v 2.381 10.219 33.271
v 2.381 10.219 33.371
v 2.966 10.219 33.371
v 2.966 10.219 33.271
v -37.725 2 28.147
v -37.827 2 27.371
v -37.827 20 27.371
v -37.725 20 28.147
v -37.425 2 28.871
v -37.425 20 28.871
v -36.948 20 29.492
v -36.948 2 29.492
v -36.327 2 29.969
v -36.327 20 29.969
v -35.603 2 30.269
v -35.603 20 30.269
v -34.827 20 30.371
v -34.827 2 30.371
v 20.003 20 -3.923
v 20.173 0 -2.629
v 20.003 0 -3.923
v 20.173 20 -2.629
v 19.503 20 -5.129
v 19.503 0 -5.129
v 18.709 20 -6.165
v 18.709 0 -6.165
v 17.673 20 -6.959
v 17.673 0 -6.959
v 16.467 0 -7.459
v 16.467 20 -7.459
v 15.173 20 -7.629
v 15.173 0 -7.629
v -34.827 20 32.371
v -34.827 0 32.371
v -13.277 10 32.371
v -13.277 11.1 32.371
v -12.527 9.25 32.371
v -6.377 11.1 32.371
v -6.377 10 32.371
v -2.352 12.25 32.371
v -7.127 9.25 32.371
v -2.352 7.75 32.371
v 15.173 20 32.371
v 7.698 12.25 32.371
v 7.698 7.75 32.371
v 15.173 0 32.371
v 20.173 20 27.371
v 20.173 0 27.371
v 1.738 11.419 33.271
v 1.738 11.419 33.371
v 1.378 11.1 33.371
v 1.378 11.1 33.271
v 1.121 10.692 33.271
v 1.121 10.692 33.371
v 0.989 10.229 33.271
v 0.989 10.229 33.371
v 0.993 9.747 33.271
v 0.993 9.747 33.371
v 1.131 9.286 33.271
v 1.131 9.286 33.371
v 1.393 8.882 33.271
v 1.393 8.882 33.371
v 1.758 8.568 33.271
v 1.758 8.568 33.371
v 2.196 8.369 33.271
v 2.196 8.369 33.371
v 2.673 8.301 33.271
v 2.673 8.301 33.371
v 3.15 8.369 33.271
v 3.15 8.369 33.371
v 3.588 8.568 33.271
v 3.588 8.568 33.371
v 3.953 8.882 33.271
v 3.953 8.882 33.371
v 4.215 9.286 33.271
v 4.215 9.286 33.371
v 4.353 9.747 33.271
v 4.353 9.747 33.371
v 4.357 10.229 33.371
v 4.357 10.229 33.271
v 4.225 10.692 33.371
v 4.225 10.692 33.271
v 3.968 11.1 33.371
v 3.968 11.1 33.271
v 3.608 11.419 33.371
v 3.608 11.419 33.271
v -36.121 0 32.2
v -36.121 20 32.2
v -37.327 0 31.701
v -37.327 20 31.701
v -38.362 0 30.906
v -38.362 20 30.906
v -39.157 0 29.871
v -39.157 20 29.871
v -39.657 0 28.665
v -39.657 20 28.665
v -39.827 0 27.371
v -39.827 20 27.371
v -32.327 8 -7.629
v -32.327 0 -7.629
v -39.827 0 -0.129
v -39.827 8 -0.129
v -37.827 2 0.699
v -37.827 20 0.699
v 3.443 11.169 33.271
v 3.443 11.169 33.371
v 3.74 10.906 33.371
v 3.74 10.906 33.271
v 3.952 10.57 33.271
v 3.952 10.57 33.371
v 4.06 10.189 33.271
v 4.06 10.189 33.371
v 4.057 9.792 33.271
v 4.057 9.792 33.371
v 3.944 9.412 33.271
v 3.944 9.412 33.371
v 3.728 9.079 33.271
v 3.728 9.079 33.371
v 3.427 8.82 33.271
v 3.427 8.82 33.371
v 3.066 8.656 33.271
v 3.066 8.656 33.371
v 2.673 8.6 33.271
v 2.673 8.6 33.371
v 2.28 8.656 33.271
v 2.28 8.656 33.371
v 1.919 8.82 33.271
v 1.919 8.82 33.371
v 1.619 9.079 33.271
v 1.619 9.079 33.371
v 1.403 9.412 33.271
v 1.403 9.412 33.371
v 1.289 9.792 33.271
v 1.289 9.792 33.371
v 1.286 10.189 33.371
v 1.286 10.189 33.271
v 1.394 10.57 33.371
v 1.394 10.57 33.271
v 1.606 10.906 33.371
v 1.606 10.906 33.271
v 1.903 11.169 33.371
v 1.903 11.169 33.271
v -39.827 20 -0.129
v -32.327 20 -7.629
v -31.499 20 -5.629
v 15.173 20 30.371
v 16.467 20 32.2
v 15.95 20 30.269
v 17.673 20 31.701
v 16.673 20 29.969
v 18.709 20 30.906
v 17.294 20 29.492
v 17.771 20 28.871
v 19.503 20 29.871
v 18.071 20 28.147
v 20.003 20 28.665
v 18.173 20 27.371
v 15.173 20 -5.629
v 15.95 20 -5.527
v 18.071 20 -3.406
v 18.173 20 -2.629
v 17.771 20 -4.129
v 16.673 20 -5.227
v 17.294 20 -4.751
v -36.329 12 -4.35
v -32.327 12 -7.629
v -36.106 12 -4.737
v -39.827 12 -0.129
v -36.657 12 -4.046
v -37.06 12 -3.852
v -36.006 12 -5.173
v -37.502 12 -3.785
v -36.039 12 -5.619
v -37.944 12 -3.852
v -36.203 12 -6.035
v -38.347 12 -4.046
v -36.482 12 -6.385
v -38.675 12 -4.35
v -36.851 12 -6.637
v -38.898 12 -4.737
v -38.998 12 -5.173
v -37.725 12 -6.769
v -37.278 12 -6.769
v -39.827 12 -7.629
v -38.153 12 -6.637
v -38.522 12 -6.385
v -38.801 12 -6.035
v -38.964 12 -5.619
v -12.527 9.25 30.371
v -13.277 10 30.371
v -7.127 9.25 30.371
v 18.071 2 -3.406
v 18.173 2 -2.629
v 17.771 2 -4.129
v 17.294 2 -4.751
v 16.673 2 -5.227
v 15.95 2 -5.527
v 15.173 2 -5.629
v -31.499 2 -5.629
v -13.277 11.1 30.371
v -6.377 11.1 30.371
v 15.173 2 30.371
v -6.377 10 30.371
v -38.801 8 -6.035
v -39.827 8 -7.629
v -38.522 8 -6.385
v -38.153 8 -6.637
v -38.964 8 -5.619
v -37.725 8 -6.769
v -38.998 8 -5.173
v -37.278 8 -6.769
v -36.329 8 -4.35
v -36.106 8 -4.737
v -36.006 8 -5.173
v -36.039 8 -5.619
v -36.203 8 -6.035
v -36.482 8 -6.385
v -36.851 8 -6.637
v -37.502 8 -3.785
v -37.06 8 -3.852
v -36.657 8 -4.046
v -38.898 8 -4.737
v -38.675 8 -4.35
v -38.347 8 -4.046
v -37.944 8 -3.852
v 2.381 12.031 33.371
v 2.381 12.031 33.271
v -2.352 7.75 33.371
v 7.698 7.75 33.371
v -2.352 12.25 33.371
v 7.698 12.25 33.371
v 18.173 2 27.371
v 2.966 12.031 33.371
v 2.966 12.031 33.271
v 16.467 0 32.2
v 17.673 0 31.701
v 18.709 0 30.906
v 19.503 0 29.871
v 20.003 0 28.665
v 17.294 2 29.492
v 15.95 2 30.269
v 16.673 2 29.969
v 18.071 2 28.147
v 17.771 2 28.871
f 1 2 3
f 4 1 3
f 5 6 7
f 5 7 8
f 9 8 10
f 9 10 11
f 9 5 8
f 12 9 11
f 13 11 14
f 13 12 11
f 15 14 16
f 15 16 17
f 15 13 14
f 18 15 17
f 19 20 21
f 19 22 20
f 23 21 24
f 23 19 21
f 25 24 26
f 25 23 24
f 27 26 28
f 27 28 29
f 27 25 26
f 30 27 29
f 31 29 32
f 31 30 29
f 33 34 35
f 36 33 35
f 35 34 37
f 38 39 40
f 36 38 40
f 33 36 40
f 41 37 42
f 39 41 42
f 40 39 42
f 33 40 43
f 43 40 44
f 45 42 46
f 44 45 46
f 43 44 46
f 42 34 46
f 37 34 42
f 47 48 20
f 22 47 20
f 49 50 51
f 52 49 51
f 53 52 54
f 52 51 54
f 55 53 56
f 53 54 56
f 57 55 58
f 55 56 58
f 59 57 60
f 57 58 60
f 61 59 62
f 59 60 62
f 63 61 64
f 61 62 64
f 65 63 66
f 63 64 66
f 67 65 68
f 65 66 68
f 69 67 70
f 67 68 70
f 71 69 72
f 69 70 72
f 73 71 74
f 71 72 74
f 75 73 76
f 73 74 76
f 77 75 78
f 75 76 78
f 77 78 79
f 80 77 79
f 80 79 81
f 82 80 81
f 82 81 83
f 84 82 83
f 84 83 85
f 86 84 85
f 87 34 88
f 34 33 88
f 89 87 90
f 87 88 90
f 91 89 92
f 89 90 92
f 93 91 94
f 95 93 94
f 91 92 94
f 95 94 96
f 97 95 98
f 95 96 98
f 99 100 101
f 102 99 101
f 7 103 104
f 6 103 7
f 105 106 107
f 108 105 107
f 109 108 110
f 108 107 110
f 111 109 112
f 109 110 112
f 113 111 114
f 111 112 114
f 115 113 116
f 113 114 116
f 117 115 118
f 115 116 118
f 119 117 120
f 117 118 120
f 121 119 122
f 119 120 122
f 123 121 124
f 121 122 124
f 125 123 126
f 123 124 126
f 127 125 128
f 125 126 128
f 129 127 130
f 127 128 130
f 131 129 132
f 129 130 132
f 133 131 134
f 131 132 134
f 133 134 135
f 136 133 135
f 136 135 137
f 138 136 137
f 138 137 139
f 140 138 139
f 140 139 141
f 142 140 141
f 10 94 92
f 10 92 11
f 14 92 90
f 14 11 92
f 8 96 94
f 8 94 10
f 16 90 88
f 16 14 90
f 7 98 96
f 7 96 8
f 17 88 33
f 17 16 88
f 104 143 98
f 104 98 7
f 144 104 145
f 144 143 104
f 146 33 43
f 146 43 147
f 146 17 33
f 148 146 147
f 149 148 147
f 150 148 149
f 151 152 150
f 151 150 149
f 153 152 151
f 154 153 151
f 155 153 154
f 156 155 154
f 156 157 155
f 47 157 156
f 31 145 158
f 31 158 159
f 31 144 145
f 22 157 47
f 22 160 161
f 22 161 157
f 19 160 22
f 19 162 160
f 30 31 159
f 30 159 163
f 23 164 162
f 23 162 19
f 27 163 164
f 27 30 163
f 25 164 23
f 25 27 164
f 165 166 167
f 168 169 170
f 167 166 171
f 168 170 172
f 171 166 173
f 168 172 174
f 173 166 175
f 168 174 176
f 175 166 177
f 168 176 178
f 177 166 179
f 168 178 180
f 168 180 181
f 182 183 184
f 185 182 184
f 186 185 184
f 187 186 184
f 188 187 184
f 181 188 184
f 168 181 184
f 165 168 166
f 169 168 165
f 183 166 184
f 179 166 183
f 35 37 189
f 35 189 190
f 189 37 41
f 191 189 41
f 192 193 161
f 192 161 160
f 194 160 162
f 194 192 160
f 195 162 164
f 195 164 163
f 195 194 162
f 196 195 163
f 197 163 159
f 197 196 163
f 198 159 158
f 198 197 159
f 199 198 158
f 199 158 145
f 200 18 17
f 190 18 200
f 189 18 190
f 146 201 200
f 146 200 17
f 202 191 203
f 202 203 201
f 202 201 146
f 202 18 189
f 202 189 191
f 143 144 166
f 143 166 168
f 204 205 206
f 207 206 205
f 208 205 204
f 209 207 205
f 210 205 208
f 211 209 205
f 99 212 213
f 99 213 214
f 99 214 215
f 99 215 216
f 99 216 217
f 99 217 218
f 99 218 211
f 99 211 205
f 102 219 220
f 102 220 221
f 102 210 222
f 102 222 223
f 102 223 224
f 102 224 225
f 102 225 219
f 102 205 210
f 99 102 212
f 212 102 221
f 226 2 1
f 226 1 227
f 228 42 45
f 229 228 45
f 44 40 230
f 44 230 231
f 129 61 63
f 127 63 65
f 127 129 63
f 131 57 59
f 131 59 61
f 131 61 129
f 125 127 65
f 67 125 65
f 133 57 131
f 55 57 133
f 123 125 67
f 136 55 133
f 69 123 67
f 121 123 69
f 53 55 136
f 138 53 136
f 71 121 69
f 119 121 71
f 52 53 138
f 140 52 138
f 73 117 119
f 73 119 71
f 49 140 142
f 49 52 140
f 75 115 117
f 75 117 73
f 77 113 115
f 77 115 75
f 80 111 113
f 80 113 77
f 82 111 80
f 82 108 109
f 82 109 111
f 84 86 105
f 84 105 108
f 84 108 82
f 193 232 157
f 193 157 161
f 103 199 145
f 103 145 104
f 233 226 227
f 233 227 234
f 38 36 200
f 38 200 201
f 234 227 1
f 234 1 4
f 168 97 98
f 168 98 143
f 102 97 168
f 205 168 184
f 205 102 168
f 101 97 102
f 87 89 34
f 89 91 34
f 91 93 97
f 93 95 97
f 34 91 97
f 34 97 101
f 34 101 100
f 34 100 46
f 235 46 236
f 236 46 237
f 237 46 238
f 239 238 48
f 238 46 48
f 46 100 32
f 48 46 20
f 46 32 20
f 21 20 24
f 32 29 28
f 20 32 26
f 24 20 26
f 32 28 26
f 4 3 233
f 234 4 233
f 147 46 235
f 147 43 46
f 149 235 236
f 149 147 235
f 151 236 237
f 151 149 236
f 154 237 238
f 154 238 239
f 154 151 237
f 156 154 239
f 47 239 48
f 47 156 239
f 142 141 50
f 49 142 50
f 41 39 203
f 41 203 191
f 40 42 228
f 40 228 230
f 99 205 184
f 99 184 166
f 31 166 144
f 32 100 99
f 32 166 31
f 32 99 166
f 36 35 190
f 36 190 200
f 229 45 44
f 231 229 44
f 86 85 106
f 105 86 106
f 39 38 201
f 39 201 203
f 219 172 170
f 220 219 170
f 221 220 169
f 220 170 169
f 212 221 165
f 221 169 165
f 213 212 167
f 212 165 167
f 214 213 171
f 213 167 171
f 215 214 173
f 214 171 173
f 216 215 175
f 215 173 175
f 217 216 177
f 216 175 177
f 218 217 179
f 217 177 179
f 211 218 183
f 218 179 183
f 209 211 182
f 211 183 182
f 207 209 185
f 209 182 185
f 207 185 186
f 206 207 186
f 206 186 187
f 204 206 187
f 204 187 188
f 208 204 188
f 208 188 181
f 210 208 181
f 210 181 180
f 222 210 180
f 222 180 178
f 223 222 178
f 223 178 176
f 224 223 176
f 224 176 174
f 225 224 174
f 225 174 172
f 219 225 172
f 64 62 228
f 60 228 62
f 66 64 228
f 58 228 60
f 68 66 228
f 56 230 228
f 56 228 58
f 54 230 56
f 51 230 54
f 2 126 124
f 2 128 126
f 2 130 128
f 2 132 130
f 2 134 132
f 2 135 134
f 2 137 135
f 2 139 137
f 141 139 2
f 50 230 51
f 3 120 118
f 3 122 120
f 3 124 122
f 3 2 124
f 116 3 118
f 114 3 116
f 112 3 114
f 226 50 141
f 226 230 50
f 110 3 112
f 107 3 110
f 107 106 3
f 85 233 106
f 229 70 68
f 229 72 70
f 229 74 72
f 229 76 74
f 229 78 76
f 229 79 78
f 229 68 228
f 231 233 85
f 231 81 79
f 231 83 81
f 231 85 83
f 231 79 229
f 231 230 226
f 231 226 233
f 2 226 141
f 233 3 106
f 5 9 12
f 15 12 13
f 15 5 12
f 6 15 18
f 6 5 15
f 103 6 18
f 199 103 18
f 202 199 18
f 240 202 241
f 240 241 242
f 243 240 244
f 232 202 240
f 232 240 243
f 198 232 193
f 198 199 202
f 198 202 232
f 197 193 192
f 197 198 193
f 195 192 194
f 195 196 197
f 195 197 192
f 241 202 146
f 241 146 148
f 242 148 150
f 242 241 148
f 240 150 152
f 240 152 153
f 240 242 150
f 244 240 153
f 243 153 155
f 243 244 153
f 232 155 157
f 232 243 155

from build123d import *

# Parameters (mm, degrees)
SKETCH4_W           = 60
SKETCH4_H           = 40
BOSS_EXTRUDE1_DEPTH = 20
FILLET1_R           = 5
FILLET2_R           = 5
CUT_EXTRUDE1_DEPTH  = 8
CUT_EXTRUDE2_DEPTH  = 8
SKETCH8_R           = 1.5
CUT_EXTRUDE4_DEPTH  = 8
SHELL3_START        = 2
SHELL3_DEPTH        = 18
SKETCH9_W           = 10.049922194
SKETCH9_H           = 4.5
BOSS_EXTRUDE2_DEPTH = 1
SKETCH10_W          = 0.584985694
SKETCH10_H          = 1.811393404
CUT_EXTRUDE5_DEPTH  = 0.1
CUT_EXTRUDE6_DEPTH  = 5.1


# Read off the part's stored shape, not the designer's step: Shell3
with BuildPart() as part:
    # Sketch4 → Boss-Extrude1 (new body)
    with BuildSketch(Plane(origin=(0, 0, 0), x_dir=(1, 0, 0), z_dir=(0, 1, 0))):
        with Locations((-9.826955075, -12.370810554)):
            Rectangle(SKETCH4_W, SKETCH4_H)
    extrude(amount=BOSS_EXTRUDE1_DEPTH)

    # Fillet1
    fillet1_edges = [part.edges().sort_by_distance(p)[0] for p in [
        (20.173044925, 10, 32.370810554),
    ]]
    fillet(fillet1_edges, radius=FILLET1_R)

    # Fillet2
    fillet2_edges = [part.edges().sort_by_distance(p)[0] for p in [
        (20.173044925, 10, -7.629189446),
        (-39.826955075, 10, 32.370810554),
    ]]
    fillet(fillet2_edges, radius=FILLET2_R)

    # Sketch6 → Cut-Extrude1 (cut)
    with BuildSketch(Plane(origin=(0, 20, 0), x_dir=(1, 0, 0), z_dir=(0, 1, 0))):
        Polygon((-32.326955075, 7.629189446), (-39.826955075, 0.129189446), (-39.826955075, 7.629189446), align=None)
    extrude(amount=-CUT_EXTRUDE1_DEPTH, mode=Mode.SUBTRACT)

    # Sketch7 → Cut-Extrude2 (cut)
    with BuildSketch(Plane.XZ):
        Polygon((-32.326955075, -7.629189446), (-39.826955075, -0.129189446), (-39.826955075, -7.629189446), align=None)
    extrude(amount=-CUT_EXTRUDE2_DEPTH, mode=Mode.SUBTRACT)

    # Sketch8 → Cut-Extrude4 (cut)
    with BuildSketch(Plane(origin=(0, 12, 0), x_dir=(1, 0, 0), z_dir=(0, 1, 0))):
        with Locations(Location((-37.501831714, 5.285439446, 0), (0, 0, 270))):
            Circle(SKETCH8_R)
    extrude(amount=-CUT_EXTRUDE4_DEPTH, mode=Mode.SUBTRACT)

    # Shell3 outline → Shell3 (cut)
    with BuildSketch(Plane(origin=(0, 0, 0), x_dir=(1, 0, 0), z_dir=(0, 1, 0)).offset(SHELL3_START)):
        with BuildLine():
            Line((-37.826955075, -0.699237679), (-37.826955075, -27.370810554))
            ThreePointArc((-37.826955075, -27.370810554), (-36.948275418, -29.492130897), (-34.826955075, -30.370810554))
            Line((-34.826955075, -30.370810554), (15.173044925, -30.370810554))
            ThreePointArc((15.173044925, -30.370810554), (17.294365268, -29.492130897), (18.173044925, -27.370810554))
            Line((18.173044925, -27.370810554), (18.173044925, 2.629189446))
            ThreePointArc((18.173044925, 2.629189446), (17.294365269, 4.75050979), (15.173044925, 5.629189446))
            Line((15.173044925, 5.629189446), (-31.49852795, 5.629189446))
            Line((-31.49852795, 5.629189446), (-37.826955075, -0.699237679))
        make_face()
    extrude(amount=SHELL3_DEPTH, mode=Mode.SUBTRACT)

    # Sketch9 → Boss-Extrude2 (add)
    with BuildSketch(Plane.XY.offset(32.370810554)):
        with Locations((2.673044925, 10)):
            Rectangle(SKETCH9_W, SKETCH9_H)
    extrude(amount=BOSS_EXTRUDE2_DEPTH)

    # Sketch10 → Cut-Extrude5 (cut)
    with BuildSketch(Plane.XY.offset(33.370810554)):
        with BuildLine():
            Line((1.902705655, 11.169007018), (1.738142725, 11.418734932))
            ThreePointArc((1.738142725, 11.418734932), (2.673044925, 8.300926449), (3.607947125, 11.418734932))
            Line((3.607947125, 11.418734932), (3.443384196, 11.169007018))
            ThreePointArc((3.443384196, 11.169007018), (2.673044925, 8.6), (1.902705655, 11.169007018))
        make_face()
        with Locations((2.673044925, 11.125)):
            Rectangle(SKETCH10_W, SKETCH10_H)
    extrude(amount=-CUT_EXTRUDE5_DEPTH, mode=Mode.SUBTRACT)

    # Sketch11 → Cut-Extrude6 (cut)
    with BuildSketch(Plane.XY.offset(32.370810554)):
        Polygon((-13.276955075, 10), (-13.276955075, 11.1), (-6.376955075, 11.1), (-6.376955075, 10), (-7.126955075, 9.25), (-9.826955075, 9.25), (-12.526955075, 9.25), align=None)
    extrude(amount=-CUT_EXTRUDE6_DEPTH, mode=Mode.SUBTRACT)


solid = part.part
